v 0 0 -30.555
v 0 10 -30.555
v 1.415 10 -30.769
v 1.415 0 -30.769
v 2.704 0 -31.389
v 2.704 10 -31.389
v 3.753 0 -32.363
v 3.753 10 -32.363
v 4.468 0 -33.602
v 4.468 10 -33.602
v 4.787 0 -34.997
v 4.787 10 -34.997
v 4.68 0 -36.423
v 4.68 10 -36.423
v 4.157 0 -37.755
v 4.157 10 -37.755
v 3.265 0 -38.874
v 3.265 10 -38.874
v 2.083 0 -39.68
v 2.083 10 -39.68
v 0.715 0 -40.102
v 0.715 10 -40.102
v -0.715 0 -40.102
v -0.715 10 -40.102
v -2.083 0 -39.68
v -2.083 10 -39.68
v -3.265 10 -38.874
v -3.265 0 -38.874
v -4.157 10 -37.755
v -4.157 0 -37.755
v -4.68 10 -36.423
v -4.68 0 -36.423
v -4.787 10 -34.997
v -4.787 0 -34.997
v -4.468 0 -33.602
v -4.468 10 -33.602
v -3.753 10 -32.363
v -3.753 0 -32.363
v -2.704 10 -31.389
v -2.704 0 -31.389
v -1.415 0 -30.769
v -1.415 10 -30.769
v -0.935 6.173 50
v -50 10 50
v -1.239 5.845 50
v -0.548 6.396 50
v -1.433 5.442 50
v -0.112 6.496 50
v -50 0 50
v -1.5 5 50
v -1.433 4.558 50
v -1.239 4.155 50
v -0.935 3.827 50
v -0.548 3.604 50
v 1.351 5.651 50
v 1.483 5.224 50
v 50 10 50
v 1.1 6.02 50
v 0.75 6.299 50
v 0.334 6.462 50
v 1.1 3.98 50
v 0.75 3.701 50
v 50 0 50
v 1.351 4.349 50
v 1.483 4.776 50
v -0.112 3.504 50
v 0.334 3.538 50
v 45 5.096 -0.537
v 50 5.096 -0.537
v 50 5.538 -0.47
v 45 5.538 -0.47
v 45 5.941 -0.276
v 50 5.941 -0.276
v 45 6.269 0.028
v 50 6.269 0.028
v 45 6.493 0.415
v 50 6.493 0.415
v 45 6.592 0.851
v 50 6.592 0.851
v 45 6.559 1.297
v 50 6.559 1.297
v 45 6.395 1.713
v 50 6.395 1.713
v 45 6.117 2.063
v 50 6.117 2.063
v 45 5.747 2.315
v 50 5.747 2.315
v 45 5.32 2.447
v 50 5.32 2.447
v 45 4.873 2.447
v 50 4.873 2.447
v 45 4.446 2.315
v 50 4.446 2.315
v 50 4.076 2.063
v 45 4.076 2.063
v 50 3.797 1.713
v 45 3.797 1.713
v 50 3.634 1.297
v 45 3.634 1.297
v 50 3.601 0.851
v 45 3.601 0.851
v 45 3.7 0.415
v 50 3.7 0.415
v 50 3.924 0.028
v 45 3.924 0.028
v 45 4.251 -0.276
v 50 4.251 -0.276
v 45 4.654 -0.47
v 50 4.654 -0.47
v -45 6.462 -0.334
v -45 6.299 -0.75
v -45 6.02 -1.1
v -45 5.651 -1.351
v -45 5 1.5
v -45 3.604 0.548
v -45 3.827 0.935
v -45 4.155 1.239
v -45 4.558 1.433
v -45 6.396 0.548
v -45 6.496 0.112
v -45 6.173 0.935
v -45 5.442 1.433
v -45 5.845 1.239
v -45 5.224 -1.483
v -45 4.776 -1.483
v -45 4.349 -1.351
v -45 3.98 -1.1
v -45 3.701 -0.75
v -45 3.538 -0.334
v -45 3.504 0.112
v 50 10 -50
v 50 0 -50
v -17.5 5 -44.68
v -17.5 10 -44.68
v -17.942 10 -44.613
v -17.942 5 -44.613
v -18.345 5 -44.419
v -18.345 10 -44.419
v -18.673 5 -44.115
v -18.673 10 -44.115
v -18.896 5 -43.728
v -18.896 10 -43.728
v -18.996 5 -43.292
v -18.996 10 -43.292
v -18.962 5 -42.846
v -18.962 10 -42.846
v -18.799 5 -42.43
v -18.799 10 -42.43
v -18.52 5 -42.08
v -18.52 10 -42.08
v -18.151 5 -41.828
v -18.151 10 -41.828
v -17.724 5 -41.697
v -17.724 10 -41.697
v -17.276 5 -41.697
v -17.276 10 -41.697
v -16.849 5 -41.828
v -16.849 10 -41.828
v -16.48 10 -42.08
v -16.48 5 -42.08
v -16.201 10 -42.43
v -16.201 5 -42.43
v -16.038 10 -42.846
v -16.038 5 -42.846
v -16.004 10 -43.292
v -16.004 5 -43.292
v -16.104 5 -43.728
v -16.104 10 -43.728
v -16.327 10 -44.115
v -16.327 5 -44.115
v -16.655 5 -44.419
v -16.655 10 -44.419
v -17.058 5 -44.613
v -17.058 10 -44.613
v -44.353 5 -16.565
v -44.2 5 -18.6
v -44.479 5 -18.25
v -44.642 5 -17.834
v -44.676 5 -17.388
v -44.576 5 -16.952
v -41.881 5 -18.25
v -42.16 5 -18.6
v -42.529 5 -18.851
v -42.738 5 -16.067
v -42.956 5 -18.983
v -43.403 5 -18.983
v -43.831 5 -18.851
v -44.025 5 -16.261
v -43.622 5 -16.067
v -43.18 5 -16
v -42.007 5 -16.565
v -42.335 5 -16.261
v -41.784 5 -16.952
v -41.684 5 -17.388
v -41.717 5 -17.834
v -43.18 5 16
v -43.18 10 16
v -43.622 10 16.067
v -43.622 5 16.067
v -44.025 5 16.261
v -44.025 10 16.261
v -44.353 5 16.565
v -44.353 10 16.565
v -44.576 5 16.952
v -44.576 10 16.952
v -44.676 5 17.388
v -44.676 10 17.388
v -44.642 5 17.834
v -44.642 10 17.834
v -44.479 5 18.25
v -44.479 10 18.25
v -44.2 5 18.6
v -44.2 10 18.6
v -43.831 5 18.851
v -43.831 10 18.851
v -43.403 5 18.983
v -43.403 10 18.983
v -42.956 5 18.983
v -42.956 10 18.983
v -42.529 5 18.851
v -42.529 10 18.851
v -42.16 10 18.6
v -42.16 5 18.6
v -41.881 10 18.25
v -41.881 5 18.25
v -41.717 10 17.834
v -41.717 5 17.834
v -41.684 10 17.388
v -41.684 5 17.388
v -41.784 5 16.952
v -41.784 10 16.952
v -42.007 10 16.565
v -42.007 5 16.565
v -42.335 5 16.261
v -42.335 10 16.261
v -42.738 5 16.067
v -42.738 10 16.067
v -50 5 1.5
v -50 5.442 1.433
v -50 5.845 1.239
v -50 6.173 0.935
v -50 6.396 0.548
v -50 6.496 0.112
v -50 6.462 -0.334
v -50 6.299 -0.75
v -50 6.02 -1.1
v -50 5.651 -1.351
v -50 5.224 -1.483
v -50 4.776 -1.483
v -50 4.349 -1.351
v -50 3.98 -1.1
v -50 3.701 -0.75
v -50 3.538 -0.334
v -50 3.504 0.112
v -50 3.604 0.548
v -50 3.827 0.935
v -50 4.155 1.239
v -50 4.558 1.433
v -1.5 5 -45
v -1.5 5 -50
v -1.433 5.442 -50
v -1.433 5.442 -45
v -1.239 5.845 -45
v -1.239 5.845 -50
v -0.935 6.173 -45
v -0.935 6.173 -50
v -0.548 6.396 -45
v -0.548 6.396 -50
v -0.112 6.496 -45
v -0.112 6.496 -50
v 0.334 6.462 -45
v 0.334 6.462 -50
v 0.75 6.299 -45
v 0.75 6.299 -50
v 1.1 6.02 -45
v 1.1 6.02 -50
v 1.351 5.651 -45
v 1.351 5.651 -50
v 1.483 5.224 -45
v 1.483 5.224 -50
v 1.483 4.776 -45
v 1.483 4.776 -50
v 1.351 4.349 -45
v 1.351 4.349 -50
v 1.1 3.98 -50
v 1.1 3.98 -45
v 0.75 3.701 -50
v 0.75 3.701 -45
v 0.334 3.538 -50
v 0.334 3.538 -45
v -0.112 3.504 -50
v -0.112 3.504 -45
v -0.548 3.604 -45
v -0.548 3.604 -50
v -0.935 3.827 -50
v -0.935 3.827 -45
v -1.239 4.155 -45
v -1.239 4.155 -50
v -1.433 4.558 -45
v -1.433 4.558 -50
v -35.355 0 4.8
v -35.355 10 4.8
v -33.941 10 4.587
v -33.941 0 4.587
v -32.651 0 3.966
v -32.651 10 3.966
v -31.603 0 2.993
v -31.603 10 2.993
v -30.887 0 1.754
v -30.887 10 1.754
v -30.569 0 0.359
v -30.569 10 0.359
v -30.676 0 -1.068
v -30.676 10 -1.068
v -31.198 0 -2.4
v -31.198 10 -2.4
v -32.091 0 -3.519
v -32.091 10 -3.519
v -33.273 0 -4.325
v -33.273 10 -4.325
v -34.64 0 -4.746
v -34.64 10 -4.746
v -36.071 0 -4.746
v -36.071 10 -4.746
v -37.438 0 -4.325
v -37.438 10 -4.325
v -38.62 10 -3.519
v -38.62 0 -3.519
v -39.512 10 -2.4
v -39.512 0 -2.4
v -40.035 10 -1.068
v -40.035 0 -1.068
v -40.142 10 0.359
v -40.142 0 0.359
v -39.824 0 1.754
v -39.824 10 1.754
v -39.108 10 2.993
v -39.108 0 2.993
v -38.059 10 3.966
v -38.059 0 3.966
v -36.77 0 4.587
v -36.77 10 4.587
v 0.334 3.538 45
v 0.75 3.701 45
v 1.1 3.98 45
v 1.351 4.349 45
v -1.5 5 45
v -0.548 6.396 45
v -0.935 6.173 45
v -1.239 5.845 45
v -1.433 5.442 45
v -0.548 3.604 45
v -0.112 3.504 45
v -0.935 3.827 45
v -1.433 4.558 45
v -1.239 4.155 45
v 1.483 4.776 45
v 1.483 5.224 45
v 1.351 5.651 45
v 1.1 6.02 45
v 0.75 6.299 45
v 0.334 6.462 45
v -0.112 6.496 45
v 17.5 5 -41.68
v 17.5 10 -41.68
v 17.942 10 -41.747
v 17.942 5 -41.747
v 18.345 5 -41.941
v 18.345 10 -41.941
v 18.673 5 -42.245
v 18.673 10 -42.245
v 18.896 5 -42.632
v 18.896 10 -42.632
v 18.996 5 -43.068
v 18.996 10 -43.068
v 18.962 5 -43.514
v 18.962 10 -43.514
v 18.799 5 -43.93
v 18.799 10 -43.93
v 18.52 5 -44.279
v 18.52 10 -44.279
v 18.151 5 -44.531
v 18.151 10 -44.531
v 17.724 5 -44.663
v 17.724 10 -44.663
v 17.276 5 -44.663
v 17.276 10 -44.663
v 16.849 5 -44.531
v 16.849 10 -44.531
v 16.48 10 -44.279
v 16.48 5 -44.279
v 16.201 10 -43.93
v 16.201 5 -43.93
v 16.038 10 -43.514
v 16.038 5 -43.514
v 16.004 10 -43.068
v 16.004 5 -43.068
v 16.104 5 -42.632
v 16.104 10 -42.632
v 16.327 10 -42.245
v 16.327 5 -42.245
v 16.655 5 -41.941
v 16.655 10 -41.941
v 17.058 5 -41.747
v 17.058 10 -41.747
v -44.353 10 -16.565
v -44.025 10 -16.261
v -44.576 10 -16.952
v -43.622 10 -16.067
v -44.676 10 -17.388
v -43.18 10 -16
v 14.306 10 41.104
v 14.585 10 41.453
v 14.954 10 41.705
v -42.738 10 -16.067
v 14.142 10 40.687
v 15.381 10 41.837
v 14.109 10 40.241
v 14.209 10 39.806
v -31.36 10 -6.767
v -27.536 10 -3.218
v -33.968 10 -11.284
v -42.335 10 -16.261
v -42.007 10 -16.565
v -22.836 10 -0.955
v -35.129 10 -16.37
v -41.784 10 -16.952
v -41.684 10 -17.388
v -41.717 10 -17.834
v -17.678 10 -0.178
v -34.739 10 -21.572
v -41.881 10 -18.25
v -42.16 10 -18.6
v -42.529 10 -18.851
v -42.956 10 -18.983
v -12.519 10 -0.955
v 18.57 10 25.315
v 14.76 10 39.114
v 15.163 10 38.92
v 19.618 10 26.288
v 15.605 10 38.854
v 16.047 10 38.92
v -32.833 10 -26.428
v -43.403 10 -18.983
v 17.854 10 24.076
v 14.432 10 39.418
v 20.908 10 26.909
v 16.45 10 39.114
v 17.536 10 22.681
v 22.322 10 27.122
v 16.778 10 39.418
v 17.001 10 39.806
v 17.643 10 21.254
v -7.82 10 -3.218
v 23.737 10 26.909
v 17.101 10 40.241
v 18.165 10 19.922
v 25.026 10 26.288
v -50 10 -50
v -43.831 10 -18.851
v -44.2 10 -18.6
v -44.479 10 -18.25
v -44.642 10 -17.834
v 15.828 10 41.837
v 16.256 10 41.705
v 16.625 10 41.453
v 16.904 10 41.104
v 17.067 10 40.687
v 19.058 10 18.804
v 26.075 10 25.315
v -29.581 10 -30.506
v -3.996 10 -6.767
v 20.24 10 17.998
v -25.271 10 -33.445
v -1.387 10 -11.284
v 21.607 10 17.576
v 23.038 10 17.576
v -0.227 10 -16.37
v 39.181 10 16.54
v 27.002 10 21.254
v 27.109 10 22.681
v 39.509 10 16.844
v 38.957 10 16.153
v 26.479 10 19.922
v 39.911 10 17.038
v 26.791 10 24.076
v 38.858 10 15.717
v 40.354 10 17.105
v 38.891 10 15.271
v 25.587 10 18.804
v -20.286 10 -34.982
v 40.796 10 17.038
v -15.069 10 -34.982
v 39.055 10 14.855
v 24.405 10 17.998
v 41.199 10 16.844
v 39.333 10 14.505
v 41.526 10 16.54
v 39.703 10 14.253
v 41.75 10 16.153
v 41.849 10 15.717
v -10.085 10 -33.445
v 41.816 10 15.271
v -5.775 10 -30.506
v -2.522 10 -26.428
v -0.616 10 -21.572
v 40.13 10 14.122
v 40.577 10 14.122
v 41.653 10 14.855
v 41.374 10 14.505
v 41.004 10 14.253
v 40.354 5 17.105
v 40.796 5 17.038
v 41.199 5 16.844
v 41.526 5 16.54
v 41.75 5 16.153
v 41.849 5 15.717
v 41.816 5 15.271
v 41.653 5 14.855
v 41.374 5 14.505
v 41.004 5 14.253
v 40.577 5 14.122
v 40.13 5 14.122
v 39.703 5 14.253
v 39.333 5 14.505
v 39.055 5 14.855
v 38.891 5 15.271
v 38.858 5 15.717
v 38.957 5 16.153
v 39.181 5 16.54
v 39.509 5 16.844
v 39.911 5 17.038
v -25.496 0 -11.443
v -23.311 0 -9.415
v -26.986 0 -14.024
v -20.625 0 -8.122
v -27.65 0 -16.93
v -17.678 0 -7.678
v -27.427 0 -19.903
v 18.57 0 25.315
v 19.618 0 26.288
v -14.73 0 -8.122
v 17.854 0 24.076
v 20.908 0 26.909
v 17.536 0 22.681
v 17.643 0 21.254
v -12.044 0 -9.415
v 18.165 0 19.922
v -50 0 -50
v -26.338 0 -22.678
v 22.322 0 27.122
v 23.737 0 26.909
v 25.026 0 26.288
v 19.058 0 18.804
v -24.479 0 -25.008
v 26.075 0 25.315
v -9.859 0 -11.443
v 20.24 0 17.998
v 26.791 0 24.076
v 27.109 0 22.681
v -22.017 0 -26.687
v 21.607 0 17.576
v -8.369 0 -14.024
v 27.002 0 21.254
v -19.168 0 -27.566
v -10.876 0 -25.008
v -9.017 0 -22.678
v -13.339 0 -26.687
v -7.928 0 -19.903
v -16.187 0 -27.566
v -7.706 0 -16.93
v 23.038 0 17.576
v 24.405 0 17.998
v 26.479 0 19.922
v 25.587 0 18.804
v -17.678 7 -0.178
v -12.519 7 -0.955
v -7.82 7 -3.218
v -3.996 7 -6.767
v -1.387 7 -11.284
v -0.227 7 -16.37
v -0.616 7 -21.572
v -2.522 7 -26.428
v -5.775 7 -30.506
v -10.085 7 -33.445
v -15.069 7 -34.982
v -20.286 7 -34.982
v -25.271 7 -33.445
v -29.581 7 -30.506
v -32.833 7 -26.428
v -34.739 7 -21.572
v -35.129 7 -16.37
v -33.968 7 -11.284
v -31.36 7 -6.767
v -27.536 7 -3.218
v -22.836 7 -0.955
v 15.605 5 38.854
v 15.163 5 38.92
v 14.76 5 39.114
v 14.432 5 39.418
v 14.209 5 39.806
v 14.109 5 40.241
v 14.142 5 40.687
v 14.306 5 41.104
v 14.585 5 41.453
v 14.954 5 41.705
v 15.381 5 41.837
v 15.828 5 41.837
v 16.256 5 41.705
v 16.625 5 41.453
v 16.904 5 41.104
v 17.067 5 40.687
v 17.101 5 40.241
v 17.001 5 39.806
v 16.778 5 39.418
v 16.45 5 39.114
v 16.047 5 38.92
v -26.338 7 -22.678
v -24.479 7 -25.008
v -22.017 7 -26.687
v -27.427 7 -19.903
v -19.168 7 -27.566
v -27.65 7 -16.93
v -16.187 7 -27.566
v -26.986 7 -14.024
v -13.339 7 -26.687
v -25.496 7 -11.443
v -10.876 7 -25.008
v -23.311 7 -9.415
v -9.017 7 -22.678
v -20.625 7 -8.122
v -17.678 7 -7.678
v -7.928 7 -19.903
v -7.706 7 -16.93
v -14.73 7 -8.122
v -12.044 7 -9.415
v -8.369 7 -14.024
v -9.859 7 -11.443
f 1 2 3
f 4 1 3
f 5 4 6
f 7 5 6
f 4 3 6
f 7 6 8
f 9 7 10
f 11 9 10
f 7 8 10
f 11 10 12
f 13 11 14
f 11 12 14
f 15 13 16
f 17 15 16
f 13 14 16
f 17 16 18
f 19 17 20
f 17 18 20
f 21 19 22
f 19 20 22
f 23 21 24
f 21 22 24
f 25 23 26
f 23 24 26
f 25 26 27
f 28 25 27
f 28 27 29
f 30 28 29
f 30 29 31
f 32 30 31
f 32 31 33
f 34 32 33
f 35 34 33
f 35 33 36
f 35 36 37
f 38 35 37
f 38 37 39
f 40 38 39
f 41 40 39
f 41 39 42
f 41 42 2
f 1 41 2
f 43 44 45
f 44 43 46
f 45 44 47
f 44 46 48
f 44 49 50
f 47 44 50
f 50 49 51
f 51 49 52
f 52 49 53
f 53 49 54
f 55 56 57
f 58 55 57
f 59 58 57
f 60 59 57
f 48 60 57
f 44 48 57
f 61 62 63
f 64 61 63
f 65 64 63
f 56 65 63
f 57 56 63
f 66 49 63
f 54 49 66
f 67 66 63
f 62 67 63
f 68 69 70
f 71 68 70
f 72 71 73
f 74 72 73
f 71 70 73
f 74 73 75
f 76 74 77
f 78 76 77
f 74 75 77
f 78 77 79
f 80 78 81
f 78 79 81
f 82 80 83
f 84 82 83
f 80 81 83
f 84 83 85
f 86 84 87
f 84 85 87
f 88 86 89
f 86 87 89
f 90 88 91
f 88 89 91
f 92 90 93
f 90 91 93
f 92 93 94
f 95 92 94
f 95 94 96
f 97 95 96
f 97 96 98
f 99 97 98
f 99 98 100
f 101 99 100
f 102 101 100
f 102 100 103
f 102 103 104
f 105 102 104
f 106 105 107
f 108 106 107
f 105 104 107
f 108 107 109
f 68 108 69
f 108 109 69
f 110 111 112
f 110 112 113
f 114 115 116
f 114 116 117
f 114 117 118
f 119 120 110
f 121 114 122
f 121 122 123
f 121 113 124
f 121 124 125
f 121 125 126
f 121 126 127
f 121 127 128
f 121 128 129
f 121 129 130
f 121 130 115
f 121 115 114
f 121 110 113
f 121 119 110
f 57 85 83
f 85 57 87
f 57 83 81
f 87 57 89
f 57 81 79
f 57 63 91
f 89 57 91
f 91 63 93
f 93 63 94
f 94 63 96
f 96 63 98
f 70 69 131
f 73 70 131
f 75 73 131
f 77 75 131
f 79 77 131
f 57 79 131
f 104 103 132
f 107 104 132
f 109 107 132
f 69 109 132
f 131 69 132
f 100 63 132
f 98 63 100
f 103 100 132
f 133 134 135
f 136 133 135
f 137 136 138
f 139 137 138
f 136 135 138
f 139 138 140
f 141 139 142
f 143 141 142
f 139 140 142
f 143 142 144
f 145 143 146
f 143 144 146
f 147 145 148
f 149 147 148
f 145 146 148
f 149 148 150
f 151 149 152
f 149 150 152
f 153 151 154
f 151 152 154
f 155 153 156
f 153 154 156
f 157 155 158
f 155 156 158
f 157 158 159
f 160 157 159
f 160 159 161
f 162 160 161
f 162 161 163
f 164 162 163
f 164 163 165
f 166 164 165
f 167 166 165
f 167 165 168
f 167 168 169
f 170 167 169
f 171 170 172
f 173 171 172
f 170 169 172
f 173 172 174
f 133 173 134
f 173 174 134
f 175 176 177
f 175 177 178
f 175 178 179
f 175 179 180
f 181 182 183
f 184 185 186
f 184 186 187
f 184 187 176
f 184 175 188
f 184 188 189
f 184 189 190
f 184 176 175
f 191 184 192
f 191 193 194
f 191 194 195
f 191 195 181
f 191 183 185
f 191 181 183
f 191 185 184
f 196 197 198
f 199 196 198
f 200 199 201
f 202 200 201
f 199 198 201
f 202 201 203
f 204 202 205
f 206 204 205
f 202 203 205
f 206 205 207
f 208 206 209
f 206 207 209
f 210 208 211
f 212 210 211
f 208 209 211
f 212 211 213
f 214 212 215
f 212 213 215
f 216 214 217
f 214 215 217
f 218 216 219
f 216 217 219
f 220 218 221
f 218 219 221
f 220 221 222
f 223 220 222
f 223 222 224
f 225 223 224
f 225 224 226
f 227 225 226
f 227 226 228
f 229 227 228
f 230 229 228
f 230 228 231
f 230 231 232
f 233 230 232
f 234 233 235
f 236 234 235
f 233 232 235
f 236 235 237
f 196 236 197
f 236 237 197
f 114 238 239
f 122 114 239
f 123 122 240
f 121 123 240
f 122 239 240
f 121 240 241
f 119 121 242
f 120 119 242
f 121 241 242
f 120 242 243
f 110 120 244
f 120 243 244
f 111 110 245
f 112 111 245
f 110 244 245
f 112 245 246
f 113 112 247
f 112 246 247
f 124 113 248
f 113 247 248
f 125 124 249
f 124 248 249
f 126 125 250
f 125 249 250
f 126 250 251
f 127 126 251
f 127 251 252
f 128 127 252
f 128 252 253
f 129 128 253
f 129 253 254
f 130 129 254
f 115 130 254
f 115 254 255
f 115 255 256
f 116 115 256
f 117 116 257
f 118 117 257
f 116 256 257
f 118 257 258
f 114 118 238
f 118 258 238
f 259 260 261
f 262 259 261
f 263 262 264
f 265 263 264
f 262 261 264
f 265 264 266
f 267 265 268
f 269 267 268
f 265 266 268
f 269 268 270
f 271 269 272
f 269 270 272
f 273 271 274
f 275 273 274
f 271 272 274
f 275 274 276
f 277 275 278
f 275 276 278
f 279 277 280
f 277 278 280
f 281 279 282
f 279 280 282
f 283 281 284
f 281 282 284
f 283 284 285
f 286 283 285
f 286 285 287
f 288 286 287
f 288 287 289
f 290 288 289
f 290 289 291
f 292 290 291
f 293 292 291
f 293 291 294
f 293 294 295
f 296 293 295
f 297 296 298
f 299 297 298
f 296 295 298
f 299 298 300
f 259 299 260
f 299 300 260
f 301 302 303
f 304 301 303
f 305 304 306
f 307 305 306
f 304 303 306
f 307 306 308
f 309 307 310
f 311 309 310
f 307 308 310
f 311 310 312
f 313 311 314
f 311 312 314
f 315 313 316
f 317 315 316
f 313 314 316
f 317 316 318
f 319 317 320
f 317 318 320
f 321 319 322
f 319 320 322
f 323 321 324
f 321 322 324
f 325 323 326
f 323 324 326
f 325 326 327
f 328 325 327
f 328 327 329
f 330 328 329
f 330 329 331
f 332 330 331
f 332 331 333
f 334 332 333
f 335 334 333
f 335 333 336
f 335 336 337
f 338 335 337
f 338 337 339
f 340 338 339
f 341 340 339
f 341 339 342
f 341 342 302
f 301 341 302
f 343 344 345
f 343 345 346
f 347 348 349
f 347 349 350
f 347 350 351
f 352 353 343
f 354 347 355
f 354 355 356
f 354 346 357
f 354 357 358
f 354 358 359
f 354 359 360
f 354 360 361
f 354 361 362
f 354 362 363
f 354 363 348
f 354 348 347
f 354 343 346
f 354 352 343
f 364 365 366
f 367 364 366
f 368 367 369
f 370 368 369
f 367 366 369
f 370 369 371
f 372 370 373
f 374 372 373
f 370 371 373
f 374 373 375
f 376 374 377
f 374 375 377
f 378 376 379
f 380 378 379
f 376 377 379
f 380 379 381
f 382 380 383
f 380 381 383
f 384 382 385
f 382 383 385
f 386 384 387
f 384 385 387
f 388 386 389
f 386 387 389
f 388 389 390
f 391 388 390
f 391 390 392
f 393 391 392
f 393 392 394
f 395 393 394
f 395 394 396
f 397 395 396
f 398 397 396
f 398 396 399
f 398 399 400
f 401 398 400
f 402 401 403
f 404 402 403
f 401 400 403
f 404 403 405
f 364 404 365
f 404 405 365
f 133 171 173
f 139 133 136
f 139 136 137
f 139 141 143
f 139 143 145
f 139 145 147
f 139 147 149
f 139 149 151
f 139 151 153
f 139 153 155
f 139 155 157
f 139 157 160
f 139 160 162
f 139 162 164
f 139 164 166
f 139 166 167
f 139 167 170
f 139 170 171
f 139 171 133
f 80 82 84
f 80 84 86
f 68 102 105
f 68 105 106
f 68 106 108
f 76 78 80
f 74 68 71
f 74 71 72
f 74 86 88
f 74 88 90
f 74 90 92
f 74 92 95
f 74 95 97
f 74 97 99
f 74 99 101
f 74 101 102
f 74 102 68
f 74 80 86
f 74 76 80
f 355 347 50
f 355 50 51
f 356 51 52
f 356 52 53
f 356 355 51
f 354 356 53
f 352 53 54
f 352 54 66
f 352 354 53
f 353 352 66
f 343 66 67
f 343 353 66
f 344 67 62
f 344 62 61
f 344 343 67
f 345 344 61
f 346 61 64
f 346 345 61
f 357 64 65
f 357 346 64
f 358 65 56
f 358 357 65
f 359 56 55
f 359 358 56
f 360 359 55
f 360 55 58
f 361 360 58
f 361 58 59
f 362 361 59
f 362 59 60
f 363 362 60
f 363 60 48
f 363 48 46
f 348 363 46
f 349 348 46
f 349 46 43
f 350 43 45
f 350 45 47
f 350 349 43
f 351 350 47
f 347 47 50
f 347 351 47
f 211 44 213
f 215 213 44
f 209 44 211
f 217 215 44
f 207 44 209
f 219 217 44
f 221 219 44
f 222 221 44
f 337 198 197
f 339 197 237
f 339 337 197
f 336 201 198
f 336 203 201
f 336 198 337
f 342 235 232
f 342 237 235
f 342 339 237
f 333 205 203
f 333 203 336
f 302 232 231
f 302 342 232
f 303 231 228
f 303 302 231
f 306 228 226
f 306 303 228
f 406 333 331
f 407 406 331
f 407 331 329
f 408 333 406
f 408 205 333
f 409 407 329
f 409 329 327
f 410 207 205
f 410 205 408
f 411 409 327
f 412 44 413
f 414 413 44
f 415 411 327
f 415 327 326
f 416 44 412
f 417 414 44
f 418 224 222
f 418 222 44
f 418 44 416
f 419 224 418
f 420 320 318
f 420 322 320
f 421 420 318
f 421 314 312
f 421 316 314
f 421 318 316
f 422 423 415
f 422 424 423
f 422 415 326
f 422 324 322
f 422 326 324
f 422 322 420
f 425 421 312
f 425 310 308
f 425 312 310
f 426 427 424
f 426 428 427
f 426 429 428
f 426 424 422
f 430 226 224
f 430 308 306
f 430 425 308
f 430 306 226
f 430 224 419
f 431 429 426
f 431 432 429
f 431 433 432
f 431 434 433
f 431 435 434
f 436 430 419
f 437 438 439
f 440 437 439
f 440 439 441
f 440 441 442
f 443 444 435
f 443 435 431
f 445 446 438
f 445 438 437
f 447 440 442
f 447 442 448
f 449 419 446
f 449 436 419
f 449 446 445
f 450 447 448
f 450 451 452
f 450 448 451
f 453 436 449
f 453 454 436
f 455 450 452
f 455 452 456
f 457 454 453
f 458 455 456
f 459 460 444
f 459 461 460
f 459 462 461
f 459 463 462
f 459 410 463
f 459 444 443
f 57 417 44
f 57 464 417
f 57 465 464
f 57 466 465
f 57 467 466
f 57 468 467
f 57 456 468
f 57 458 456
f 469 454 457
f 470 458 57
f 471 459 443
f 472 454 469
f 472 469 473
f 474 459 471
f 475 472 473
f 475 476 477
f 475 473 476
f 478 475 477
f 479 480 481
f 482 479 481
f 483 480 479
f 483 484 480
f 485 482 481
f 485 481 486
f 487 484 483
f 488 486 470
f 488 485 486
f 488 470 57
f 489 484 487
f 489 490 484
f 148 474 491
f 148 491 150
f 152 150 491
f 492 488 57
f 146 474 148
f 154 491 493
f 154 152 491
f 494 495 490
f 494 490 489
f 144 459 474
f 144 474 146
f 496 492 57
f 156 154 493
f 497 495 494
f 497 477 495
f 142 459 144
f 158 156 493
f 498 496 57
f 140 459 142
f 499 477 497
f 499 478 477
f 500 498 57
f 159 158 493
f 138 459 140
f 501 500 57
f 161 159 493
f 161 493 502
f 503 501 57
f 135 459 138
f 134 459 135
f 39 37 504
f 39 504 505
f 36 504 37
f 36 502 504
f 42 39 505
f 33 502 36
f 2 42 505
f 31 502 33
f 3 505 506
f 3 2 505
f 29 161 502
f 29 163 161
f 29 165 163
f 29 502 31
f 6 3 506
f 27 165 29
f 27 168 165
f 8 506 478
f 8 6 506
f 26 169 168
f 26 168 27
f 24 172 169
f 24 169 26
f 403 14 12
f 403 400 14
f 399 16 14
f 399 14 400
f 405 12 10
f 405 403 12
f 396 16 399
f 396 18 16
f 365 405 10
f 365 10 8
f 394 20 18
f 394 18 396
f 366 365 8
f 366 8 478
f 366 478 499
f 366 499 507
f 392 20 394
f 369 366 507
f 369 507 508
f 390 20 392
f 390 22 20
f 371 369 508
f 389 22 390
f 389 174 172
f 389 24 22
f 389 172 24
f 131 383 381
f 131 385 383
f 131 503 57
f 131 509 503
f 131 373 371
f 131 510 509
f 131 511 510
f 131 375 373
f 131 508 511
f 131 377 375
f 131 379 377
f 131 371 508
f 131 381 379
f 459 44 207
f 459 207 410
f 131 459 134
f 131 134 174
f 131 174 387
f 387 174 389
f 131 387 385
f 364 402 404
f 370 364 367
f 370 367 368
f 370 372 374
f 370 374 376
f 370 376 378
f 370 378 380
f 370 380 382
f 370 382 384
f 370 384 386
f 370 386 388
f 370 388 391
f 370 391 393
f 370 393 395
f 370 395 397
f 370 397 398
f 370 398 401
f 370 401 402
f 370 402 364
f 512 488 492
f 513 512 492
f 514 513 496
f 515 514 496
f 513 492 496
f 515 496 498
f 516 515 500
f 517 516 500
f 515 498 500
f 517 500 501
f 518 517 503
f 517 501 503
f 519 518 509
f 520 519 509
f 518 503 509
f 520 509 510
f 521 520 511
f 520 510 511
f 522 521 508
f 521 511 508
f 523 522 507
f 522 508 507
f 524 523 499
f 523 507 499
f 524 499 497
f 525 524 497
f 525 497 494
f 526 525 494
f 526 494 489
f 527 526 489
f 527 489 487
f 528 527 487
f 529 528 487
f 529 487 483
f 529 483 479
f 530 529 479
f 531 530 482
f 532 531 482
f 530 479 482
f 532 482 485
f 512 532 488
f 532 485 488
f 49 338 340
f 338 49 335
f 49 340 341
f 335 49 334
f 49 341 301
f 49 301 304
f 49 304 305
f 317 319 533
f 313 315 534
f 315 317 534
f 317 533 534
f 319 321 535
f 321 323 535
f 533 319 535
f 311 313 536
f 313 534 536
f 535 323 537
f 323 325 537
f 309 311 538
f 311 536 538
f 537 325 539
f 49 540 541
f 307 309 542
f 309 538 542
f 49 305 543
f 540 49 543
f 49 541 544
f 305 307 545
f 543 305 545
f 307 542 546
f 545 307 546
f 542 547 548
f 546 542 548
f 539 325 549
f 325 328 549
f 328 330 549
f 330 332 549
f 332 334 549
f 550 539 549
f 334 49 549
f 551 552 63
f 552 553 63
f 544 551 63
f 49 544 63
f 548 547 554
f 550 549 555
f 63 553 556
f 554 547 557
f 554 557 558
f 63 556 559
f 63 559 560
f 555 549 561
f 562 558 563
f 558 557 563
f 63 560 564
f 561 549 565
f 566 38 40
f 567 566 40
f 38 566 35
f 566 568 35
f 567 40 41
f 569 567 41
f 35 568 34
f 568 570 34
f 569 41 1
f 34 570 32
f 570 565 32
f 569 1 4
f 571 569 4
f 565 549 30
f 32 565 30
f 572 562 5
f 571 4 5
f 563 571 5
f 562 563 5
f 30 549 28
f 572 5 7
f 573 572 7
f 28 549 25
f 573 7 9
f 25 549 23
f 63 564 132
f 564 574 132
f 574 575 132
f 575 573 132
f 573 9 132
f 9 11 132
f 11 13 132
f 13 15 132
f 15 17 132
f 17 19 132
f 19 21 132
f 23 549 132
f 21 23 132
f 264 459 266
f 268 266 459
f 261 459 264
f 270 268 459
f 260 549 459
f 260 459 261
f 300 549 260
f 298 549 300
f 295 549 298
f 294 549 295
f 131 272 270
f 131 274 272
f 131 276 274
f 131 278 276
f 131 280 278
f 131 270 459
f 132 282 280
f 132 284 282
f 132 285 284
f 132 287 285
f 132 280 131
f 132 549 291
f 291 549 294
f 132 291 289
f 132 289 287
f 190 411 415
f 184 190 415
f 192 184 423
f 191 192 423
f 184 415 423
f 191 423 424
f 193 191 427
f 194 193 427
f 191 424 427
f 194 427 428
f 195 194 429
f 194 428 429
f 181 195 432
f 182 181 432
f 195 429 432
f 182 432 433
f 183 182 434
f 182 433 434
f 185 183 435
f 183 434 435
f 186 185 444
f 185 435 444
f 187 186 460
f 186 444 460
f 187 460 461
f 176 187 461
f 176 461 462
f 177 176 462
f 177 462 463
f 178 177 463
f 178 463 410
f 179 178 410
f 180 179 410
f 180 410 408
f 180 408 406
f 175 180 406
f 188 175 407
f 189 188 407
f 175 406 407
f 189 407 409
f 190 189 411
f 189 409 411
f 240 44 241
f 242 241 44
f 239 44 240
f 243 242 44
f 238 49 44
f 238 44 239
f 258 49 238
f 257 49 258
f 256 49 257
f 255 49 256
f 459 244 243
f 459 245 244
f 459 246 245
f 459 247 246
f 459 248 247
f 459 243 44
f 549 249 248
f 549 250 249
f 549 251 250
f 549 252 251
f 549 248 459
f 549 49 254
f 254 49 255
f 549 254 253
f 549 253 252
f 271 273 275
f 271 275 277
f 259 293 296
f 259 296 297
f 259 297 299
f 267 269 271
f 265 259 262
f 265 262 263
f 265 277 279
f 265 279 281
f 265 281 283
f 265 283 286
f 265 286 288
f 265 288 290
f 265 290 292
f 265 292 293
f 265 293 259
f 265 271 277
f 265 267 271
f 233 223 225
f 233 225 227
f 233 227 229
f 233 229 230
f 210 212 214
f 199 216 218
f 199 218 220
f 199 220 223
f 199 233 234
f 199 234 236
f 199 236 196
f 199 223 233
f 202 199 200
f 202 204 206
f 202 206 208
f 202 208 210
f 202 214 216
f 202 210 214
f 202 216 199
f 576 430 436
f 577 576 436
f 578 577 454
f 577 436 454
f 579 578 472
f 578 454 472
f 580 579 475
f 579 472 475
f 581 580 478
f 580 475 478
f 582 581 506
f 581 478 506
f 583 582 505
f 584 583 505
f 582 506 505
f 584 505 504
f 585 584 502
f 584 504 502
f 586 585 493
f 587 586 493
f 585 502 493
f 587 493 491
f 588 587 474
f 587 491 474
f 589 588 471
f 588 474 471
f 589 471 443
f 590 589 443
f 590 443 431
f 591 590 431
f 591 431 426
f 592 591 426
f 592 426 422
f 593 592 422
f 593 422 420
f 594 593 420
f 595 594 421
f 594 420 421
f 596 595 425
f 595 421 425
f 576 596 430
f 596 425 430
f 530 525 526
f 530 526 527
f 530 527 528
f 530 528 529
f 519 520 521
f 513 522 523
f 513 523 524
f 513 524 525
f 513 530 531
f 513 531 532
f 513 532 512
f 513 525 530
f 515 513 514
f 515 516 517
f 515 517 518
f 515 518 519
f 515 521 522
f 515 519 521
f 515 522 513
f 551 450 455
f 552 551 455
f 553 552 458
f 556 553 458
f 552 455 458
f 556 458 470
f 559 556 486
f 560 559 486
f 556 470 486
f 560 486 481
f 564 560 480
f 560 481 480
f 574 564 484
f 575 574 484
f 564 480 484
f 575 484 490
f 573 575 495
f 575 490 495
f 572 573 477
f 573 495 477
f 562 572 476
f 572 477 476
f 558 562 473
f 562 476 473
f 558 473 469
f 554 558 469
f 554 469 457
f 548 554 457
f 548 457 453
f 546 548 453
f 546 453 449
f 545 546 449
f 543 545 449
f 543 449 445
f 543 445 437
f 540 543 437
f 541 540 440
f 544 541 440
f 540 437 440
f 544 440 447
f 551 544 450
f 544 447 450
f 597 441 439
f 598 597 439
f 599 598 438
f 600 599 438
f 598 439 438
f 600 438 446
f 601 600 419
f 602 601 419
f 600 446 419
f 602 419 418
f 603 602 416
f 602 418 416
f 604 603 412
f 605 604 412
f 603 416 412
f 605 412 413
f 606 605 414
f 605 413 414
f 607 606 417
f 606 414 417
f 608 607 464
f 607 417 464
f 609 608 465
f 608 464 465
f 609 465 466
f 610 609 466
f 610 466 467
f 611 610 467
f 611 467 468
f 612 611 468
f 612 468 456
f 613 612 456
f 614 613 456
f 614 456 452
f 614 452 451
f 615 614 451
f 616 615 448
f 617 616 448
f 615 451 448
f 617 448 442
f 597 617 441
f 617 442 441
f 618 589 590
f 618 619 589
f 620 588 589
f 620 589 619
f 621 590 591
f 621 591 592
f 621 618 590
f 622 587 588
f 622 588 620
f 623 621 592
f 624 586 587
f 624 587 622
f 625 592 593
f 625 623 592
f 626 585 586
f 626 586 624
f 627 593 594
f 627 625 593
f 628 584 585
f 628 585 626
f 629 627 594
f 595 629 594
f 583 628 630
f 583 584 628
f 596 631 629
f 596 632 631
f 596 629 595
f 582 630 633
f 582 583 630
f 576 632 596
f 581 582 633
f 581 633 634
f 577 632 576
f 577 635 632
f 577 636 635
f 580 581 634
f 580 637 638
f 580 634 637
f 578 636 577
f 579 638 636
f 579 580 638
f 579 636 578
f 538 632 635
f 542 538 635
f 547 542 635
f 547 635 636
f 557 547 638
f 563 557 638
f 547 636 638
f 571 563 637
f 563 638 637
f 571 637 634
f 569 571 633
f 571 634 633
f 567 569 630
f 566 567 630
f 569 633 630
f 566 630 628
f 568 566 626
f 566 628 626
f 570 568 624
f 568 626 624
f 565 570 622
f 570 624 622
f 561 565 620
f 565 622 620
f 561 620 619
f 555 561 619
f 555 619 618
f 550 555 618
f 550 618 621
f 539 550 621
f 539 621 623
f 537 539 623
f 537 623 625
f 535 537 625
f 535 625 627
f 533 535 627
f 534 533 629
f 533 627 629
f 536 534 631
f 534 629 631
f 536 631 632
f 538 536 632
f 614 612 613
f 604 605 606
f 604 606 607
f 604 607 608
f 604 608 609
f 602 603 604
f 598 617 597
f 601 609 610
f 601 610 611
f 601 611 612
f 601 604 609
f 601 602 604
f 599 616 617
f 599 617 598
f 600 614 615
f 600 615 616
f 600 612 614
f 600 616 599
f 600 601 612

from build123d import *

# Parameters (mm, degrees)
SKETCH1_W           = 100
SKETCH1_H           = 100
BOSS_EXTRUDE1_DEPTH = 10
SKETCH2_R           = 17.5
CUT_EXTRUDE1_DEPTH  = 3
SKETCH4_R           = 10
CUT_EXTRUDE2_DEPTH  = 7
SKETCH5_R           = 4.8
CUT_EXTRUDE3_DEPTH  = 20
SKETCH6_R           = 1.5
CUT_EXTRUDE4_DEPTH  = 5
SKETCH7_R           = 4.8
CUT_EXTRUDE5_DEPTH  = 10
SKETCH8_R           = 1.5
CUT_EXTRUDE6_DEPTH  = 5
SKETCH9_R           = 1.5
CUT_EXTRUDE7_DEPTH  = 5
SKETCH10_R          = 1.5
CUT_EXTRUDE8_DEPTH  = 5
SKETCH11_R          = 1.5
CUT_EXTRUDE9_DEPTH  = 5
CUT_EXTRUDE10_START = -5
SKETCH12_R          = 1.5
CUT_EXTRUDE10_DEPTH = 5


with BuildPart() as part:
    # Sketch1 → Boss-Extrude1 (new body)
    with BuildSketch(Plane(origin=(0, 0, 0), x_dir=(1, 0, 0), z_dir=(0, 1, 0))):
        Rectangle(SKETCH1_W, SKETCH1_H)
    extrude(amount=BOSS_EXTRUDE1_DEPTH)

    # Sketch2 → Cut-Extrude1 (cut)
    with BuildSketch(Plane(origin=(0, 10, 0), x_dir=(1, 0, 0), z_dir=(0, 1, 0))):
        with Locations(Location((-17.67766953, 17.67766953, 0), (0, 0, 270))):
            Circle(SKETCH2_R)
    extrude(amount=-CUT_EXTRUDE1_DEPTH, mode=Mode.SUBTRACT)

    # Sketch4 → Cut-Extrude2 (cut)
    with BuildSketch(Plane(origin=(0, 7, 0), x_dir=(1, 0, 0), z_dir=(0, 1, 0))):
        with Locations(Location((-17.67766953, 17.67766953, 0), (0, 0, 270))):
            Circle(SKETCH4_R)
    extrude(amount=-CUT_EXTRUDE2_DEPTH, mode=Mode.SUBTRACT)

    # Sketch5 → Cut-Extrude3 (cut)
    with BuildSketch(Plane(origin=(0, 10, 0), x_dir=(1, 0, 0), z_dir=(0, 1, 0))):
        with Locations(Location((-35.355339059, 0, 0), (0, 0, 270))):
            Circle(SKETCH5_R)
        with Locations(Location((0, 35.355339059, 0), (0, 0, 270))):
            Circle(SKETCH5_R)
    extrude(amount=-CUT_EXTRUDE3_DEPTH, mode=Mode.SUBTRACT)

    # Sketch6 → Cut-Extrude4 (cut)
    with BuildSketch(Plane(origin=(0, 10, 0), x_dir=(1, 0, 0), z_dir=(0, 1, 0))):
        with Locations(Location((-43.179859239, 17.5, 0), (0, 0, 270))):
            Circle(SKETCH6_R)
        with Locations(Location((-43.179859239, -17.5, 0), (0, 0, 90))):
            Circle(SKETCH6_R)
        with Locations(Location((17.5, 43.179859239, 0), (0, 0, 270))):
            Circle(SKETCH6_R)
        with Locations(Location((-17.5, 43.179859239, 0), (0, 0, 90))):
            Circle(SKETCH6_R)
    extrude(amount=-CUT_EXTRUDE4_DEPTH, mode=Mode.SUBTRACT)

    # Sketch7 → Cut-Extrude5 (cut)
    with BuildSketch(Plane(origin=(0, 10, 0), x_dir=(1, 0, 0), z_dir=(0, 1, 0))):
        with Locations(Location((22.32233047, -22.32233047, 0), (0, 0, 270))):
            Circle(SKETCH7_R)
    extrude(amount=-CUT_EXTRUDE5_DEPTH, mode=Mode.SUBTRACT)

    # Sketch8 → Cut-Extrude6 (cut)
    with BuildSketch(Plane(origin=(0, 10, 0), x_dir=(1, 0, 0), z_dir=(0, 1, 0))):
        with Locations(Location((40.353553391, -15.604816049, 0), (0, 0, 270))):
            Circle(SKETCH8_R)
        with Locations(Location((15.604816049, -40.353553391, 0), (0, 0, 90))):
            Circle(SKETCH8_R)
    extrude(amount=-CUT_EXTRUDE6_DEPTH, mode=Mode.SUBTRACT)

    # Sketch9 → Cut-Extrude7 (cut)
    with BuildSketch(Plane(origin=(50, 0, 0), x_dir=(0, 0, -1), z_dir=(1, 0, 0))):
        with Locations((-0.963309919, 5.096330992)):
            Circle(SKETCH9_R)
    extrude(amount=-CUT_EXTRUDE7_DEPTH, mode=Mode.SUBTRACT)

    # Sketch10 → Cut-Extrude8 (cut)
    with BuildSketch(Plane(origin=(0, 0, -50), x_dir=(-1, 0, 0), z_dir=(0, 0, -1))):
        with Locations((0, 5)):
            Circle(SKETCH10_R)
    extrude(amount=-CUT_EXTRUDE8_DEPTH, mode=Mode.SUBTRACT)

    # Sketch11 → Cut-Extrude9 (cut)
    with BuildSketch(Plane.ZY.offset(50)):
        with Locations((0, 5)):
            Circle(SKETCH11_R)
    extrude(amount=-CUT_EXTRUDE9_DEPTH, mode=Mode.SUBTRACT)

    # Sketch12 → Cut-Extrude10 (cut)
    with BuildSketch(Plane.XY.offset(50).offset(CUT_EXTRUDE10_START)):
        with Locations(Location((0, 5, 0), (0, 0, 180))):
            Circle(SKETCH12_R)
    extrude(amount=CUT_EXTRUDE10_DEPTH, mode=Mode.SUBTRACT)


solid = part.part
